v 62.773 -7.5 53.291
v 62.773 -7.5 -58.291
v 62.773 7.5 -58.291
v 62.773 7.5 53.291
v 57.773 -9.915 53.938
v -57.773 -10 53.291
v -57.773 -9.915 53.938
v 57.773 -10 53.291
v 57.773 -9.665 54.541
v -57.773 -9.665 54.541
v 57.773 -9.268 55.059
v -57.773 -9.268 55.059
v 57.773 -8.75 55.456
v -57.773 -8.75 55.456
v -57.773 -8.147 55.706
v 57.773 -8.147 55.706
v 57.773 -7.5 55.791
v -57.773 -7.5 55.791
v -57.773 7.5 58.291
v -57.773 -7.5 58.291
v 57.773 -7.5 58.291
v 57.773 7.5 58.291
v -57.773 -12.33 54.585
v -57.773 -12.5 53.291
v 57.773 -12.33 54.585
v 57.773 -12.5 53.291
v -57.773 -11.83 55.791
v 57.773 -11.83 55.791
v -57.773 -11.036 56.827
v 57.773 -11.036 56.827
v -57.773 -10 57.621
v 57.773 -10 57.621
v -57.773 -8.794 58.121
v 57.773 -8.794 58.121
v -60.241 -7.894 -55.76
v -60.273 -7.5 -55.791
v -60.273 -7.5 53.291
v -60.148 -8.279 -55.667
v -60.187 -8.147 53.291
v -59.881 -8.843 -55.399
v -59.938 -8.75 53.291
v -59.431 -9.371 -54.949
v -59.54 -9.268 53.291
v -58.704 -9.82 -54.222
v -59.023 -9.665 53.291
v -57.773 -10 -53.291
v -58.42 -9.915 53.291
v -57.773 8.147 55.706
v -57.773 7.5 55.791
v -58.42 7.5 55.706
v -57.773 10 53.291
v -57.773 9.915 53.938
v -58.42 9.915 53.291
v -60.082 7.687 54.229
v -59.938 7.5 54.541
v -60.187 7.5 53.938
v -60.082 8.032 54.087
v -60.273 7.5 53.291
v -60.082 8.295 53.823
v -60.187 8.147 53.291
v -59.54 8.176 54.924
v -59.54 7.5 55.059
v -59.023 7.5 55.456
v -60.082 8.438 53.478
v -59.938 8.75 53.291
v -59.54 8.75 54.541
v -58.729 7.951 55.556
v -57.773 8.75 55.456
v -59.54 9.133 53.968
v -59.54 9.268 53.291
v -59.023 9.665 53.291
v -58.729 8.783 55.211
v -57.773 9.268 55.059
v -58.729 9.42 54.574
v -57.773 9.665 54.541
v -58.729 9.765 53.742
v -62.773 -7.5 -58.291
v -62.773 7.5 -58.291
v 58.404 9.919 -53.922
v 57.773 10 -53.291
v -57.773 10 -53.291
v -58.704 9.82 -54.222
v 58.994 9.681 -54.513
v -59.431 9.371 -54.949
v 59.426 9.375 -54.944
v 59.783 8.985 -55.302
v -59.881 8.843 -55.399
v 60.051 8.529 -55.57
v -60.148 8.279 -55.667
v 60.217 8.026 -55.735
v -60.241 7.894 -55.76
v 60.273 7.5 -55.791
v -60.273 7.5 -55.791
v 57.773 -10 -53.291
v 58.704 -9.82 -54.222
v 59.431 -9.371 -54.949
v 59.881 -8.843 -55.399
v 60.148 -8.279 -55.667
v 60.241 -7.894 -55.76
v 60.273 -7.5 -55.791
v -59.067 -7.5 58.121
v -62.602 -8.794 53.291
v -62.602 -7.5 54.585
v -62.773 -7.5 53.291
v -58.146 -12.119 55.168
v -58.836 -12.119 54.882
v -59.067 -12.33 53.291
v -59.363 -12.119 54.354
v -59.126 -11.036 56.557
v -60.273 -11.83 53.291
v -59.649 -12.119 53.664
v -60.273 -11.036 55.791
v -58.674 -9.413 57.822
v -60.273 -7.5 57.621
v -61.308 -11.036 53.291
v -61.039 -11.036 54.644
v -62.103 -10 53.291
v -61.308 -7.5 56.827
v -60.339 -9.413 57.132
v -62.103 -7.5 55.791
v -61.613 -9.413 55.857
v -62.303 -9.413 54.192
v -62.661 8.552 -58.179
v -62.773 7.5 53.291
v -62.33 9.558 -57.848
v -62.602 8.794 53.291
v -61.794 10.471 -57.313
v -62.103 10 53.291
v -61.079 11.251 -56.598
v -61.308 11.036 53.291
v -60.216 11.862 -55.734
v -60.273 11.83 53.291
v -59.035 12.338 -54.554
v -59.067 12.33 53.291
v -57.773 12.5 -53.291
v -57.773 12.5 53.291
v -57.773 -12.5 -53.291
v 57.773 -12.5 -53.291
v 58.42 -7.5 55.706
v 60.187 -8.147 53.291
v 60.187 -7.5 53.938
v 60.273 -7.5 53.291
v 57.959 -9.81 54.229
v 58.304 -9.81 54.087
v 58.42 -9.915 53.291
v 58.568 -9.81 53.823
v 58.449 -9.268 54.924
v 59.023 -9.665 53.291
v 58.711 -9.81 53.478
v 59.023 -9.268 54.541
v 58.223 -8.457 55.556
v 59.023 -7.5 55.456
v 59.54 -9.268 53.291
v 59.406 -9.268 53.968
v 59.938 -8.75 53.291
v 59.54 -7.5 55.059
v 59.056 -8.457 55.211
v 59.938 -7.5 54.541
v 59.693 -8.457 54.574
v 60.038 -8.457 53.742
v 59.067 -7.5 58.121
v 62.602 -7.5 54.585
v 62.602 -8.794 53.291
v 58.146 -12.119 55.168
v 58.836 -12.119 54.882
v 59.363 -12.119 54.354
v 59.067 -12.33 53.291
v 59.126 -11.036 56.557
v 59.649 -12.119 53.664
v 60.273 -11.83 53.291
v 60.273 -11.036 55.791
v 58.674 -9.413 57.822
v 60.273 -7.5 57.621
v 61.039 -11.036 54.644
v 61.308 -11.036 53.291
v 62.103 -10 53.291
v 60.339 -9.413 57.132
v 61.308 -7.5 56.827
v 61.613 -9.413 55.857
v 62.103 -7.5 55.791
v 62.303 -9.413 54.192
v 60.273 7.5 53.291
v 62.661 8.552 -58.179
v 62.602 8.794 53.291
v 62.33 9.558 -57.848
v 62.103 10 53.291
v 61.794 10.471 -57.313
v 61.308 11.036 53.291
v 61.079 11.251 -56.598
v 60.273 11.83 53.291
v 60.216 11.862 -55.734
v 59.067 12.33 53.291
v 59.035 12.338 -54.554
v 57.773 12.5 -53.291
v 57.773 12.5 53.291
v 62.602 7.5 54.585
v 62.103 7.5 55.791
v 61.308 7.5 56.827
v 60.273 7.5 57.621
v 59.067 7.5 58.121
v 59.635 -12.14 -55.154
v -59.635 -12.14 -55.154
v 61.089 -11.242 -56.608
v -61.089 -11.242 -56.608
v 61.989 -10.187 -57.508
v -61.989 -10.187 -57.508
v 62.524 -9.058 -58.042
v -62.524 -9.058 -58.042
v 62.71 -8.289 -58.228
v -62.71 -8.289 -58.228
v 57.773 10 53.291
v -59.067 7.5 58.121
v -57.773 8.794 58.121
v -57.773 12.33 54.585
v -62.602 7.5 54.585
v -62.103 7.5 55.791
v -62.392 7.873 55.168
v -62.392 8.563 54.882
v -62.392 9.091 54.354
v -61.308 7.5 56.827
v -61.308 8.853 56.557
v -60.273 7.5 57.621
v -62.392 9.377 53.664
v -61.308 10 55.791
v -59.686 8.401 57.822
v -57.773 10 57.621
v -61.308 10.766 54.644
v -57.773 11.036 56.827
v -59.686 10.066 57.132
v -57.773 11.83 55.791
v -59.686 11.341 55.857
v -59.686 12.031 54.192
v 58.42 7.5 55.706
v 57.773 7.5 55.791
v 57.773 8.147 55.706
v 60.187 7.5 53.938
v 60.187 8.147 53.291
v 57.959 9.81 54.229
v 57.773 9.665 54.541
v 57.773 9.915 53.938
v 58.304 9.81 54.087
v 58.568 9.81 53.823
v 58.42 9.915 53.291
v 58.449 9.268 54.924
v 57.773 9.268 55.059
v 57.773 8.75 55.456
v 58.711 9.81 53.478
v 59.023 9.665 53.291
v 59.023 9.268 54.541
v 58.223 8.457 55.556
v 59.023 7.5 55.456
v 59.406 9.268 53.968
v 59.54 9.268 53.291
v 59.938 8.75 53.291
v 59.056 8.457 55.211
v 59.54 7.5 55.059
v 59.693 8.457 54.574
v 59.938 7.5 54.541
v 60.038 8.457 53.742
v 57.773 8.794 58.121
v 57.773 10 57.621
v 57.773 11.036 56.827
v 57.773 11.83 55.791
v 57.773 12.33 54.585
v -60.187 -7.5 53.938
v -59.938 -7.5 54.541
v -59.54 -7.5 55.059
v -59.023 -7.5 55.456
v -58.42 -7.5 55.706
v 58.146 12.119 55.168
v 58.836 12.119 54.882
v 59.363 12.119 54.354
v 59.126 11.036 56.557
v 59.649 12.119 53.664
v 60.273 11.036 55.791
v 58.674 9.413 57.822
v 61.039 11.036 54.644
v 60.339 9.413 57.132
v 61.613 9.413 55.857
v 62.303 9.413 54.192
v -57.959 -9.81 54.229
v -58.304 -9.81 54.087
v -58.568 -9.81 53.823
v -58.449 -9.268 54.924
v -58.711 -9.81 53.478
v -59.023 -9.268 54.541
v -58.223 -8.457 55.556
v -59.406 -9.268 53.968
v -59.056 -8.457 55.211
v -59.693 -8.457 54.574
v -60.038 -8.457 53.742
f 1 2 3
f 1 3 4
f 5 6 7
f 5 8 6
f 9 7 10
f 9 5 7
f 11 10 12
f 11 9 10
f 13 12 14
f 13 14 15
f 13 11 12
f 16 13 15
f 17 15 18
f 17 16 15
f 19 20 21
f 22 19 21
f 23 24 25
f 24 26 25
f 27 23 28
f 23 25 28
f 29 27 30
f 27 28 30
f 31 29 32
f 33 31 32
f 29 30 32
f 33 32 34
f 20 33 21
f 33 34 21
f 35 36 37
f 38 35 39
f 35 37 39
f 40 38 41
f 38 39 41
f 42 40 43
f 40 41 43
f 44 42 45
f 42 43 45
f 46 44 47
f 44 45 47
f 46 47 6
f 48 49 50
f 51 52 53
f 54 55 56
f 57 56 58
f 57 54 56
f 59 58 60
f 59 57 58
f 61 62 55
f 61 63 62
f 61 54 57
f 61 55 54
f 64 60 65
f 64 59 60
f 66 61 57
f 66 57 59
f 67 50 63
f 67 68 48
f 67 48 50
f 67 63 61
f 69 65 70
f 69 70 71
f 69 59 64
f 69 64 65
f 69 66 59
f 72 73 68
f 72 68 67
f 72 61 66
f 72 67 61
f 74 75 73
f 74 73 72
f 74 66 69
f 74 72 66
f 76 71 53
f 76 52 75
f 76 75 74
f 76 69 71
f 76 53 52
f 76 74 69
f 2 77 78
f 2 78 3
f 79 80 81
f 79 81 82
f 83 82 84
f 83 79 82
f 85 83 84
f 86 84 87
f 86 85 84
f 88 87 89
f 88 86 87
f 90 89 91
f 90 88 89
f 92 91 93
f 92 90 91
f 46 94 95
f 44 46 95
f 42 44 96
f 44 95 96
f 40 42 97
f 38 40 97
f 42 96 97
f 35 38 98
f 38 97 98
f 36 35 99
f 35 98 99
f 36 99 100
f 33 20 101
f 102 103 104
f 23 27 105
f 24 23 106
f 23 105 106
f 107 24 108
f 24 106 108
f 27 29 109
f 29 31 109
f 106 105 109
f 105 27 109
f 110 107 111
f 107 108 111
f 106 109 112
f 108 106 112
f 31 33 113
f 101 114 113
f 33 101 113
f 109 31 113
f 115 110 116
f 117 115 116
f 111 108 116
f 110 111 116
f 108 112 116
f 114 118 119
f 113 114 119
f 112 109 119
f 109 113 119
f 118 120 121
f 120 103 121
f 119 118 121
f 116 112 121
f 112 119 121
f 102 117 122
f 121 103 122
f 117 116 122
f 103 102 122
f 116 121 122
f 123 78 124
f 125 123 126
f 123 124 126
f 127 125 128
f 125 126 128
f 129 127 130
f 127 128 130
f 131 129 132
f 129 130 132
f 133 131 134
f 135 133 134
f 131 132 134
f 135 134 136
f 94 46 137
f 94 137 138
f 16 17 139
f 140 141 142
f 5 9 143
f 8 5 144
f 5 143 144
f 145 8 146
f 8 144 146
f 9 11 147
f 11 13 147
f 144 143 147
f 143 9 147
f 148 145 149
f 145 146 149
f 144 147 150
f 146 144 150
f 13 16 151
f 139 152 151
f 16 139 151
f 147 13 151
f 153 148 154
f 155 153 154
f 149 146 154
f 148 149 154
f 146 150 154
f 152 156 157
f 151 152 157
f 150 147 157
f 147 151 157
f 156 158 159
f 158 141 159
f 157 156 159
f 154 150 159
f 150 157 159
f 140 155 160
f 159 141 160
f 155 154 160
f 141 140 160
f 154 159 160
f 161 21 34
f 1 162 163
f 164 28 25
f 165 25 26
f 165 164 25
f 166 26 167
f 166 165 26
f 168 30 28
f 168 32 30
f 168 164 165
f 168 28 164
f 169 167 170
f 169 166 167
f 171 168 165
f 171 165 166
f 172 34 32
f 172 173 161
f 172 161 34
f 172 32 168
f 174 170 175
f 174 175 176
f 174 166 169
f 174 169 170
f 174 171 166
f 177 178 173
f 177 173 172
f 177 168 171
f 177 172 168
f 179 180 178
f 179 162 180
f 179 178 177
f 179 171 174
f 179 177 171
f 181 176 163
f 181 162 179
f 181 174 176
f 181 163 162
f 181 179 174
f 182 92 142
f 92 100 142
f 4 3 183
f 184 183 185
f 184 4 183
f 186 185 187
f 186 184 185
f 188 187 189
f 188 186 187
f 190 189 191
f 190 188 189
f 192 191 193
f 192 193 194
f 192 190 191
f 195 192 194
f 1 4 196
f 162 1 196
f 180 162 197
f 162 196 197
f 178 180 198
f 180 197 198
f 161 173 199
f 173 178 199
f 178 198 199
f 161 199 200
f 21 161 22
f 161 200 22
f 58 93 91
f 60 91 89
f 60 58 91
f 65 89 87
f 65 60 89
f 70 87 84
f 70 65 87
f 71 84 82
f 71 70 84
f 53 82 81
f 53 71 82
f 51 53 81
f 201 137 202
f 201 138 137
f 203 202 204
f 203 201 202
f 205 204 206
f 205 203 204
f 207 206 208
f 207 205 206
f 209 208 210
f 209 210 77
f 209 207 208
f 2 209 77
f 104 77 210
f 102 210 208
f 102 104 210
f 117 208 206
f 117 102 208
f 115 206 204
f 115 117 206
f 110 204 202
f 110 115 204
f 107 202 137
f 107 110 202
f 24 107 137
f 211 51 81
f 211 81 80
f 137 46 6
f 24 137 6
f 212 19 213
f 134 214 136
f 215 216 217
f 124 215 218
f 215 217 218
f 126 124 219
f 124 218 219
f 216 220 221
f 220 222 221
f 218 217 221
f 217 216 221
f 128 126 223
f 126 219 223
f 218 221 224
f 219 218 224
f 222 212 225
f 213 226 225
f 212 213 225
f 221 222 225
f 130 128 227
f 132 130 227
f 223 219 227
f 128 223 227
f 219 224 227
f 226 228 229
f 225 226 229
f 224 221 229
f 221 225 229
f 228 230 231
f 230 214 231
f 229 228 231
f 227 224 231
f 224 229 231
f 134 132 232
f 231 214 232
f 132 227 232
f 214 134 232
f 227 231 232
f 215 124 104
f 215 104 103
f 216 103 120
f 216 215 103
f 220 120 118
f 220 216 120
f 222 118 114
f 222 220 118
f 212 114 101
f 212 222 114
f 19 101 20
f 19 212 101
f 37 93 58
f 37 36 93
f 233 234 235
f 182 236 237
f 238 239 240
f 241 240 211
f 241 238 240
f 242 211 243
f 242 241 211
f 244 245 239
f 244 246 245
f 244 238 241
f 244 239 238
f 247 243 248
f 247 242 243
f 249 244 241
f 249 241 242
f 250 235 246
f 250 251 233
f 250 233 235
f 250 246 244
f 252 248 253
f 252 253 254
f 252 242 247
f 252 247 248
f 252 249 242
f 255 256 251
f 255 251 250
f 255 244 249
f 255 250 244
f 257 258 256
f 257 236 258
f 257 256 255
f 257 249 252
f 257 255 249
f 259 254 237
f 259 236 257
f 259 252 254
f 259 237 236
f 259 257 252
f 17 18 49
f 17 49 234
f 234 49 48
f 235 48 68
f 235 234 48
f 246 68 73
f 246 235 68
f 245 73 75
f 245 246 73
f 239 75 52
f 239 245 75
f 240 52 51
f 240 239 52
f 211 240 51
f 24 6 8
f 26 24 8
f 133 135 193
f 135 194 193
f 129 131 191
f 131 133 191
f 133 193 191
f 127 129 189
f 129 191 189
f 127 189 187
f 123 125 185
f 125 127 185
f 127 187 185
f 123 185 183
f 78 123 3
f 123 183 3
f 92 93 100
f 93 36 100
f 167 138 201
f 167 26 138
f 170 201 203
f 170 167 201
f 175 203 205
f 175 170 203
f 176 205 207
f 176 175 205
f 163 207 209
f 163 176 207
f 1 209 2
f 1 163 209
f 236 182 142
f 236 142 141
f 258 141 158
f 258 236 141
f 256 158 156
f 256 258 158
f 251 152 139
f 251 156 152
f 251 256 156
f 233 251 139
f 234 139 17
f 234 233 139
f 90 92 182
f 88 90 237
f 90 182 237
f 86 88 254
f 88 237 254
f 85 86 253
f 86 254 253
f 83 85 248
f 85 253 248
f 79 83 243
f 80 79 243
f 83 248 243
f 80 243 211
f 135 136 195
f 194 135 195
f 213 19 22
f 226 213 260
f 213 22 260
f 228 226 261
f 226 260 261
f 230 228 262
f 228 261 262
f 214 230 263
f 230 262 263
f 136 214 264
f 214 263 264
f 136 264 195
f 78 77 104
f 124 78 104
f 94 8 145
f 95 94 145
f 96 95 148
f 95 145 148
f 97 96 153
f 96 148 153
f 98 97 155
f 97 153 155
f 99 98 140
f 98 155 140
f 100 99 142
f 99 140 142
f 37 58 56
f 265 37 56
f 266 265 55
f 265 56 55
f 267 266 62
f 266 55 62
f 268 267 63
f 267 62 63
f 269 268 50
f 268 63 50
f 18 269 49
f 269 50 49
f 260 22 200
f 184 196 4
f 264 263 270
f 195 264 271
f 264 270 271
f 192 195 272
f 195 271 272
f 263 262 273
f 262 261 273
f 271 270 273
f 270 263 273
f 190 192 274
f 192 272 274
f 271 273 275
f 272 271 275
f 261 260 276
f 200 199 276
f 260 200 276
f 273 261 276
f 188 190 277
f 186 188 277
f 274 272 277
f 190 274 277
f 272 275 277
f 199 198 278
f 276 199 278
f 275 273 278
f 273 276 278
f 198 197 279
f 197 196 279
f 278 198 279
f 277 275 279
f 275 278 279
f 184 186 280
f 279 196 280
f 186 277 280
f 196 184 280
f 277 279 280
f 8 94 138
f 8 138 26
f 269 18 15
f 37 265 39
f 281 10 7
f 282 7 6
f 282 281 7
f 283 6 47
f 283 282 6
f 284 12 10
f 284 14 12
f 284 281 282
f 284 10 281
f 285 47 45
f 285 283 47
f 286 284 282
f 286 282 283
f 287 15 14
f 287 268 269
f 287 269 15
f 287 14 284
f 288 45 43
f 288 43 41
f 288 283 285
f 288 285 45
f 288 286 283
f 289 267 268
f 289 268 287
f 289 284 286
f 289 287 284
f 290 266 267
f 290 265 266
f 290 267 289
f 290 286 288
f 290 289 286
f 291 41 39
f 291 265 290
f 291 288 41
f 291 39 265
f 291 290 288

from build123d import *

# Parameters (mm, degrees)
F0_W     = 125.545039773
F0_H     = 116.582095623
F1_DEPTH = 12.5
F2_R     = 5
F3_T     = -2.5


# Not quite as in the source:
# - a shell that OpenCascade refuses in one call is made with other operations: the cavity is built on its own and cut out


with BuildPart() as f1:
    # F0 (on Front) → F1 (new body, symmetric)
    with BuildSketch(Plane.XZ):
        Rectangle(F0_W, F0_H)
    extrude(amount=F1_DEPTH, both=True)

    # F2
    f2_edges = [f1.edges().sort_by_distance(p)[0] for p in [
        (62.77252, 0, 58.291048),
        (0, 12.5, 58.291048),
        (-62.77252, 0, 58.291048),
        (0, -12.5, 58.291048),
        (62.77252, 12.5, 0),
        (0, -12.5, -58.291048),
        (62.77252, -12.5, 0),
        (-62.77252, -12.5, 0),
        (-62.77252, 12.5, 0),
        (0, 12.5, -58.291048),
    ]]
    fillet(f2_edges, radius=F2_R)

    # F3: a shell. OpenCascade refuses it in one call, so the cavity is built on its own and cut out:
    # the body offset inwards by the wall thickness, plus a prism from it out through each open face.
    f3_core = offset(f1.part, amount=F3_T, mode=Mode.PRIVATE)
    f3_exits = [f3_core.faces().sort_by_distance(p)[0] for p in [
        (0, -10, 0),
    ]]
    add(f3_core, mode=Mode.SUBTRACT)
    extrude(f3_exits, amount=-F3_T, mode=Mode.SUBTRACT)


solid = f1.part
